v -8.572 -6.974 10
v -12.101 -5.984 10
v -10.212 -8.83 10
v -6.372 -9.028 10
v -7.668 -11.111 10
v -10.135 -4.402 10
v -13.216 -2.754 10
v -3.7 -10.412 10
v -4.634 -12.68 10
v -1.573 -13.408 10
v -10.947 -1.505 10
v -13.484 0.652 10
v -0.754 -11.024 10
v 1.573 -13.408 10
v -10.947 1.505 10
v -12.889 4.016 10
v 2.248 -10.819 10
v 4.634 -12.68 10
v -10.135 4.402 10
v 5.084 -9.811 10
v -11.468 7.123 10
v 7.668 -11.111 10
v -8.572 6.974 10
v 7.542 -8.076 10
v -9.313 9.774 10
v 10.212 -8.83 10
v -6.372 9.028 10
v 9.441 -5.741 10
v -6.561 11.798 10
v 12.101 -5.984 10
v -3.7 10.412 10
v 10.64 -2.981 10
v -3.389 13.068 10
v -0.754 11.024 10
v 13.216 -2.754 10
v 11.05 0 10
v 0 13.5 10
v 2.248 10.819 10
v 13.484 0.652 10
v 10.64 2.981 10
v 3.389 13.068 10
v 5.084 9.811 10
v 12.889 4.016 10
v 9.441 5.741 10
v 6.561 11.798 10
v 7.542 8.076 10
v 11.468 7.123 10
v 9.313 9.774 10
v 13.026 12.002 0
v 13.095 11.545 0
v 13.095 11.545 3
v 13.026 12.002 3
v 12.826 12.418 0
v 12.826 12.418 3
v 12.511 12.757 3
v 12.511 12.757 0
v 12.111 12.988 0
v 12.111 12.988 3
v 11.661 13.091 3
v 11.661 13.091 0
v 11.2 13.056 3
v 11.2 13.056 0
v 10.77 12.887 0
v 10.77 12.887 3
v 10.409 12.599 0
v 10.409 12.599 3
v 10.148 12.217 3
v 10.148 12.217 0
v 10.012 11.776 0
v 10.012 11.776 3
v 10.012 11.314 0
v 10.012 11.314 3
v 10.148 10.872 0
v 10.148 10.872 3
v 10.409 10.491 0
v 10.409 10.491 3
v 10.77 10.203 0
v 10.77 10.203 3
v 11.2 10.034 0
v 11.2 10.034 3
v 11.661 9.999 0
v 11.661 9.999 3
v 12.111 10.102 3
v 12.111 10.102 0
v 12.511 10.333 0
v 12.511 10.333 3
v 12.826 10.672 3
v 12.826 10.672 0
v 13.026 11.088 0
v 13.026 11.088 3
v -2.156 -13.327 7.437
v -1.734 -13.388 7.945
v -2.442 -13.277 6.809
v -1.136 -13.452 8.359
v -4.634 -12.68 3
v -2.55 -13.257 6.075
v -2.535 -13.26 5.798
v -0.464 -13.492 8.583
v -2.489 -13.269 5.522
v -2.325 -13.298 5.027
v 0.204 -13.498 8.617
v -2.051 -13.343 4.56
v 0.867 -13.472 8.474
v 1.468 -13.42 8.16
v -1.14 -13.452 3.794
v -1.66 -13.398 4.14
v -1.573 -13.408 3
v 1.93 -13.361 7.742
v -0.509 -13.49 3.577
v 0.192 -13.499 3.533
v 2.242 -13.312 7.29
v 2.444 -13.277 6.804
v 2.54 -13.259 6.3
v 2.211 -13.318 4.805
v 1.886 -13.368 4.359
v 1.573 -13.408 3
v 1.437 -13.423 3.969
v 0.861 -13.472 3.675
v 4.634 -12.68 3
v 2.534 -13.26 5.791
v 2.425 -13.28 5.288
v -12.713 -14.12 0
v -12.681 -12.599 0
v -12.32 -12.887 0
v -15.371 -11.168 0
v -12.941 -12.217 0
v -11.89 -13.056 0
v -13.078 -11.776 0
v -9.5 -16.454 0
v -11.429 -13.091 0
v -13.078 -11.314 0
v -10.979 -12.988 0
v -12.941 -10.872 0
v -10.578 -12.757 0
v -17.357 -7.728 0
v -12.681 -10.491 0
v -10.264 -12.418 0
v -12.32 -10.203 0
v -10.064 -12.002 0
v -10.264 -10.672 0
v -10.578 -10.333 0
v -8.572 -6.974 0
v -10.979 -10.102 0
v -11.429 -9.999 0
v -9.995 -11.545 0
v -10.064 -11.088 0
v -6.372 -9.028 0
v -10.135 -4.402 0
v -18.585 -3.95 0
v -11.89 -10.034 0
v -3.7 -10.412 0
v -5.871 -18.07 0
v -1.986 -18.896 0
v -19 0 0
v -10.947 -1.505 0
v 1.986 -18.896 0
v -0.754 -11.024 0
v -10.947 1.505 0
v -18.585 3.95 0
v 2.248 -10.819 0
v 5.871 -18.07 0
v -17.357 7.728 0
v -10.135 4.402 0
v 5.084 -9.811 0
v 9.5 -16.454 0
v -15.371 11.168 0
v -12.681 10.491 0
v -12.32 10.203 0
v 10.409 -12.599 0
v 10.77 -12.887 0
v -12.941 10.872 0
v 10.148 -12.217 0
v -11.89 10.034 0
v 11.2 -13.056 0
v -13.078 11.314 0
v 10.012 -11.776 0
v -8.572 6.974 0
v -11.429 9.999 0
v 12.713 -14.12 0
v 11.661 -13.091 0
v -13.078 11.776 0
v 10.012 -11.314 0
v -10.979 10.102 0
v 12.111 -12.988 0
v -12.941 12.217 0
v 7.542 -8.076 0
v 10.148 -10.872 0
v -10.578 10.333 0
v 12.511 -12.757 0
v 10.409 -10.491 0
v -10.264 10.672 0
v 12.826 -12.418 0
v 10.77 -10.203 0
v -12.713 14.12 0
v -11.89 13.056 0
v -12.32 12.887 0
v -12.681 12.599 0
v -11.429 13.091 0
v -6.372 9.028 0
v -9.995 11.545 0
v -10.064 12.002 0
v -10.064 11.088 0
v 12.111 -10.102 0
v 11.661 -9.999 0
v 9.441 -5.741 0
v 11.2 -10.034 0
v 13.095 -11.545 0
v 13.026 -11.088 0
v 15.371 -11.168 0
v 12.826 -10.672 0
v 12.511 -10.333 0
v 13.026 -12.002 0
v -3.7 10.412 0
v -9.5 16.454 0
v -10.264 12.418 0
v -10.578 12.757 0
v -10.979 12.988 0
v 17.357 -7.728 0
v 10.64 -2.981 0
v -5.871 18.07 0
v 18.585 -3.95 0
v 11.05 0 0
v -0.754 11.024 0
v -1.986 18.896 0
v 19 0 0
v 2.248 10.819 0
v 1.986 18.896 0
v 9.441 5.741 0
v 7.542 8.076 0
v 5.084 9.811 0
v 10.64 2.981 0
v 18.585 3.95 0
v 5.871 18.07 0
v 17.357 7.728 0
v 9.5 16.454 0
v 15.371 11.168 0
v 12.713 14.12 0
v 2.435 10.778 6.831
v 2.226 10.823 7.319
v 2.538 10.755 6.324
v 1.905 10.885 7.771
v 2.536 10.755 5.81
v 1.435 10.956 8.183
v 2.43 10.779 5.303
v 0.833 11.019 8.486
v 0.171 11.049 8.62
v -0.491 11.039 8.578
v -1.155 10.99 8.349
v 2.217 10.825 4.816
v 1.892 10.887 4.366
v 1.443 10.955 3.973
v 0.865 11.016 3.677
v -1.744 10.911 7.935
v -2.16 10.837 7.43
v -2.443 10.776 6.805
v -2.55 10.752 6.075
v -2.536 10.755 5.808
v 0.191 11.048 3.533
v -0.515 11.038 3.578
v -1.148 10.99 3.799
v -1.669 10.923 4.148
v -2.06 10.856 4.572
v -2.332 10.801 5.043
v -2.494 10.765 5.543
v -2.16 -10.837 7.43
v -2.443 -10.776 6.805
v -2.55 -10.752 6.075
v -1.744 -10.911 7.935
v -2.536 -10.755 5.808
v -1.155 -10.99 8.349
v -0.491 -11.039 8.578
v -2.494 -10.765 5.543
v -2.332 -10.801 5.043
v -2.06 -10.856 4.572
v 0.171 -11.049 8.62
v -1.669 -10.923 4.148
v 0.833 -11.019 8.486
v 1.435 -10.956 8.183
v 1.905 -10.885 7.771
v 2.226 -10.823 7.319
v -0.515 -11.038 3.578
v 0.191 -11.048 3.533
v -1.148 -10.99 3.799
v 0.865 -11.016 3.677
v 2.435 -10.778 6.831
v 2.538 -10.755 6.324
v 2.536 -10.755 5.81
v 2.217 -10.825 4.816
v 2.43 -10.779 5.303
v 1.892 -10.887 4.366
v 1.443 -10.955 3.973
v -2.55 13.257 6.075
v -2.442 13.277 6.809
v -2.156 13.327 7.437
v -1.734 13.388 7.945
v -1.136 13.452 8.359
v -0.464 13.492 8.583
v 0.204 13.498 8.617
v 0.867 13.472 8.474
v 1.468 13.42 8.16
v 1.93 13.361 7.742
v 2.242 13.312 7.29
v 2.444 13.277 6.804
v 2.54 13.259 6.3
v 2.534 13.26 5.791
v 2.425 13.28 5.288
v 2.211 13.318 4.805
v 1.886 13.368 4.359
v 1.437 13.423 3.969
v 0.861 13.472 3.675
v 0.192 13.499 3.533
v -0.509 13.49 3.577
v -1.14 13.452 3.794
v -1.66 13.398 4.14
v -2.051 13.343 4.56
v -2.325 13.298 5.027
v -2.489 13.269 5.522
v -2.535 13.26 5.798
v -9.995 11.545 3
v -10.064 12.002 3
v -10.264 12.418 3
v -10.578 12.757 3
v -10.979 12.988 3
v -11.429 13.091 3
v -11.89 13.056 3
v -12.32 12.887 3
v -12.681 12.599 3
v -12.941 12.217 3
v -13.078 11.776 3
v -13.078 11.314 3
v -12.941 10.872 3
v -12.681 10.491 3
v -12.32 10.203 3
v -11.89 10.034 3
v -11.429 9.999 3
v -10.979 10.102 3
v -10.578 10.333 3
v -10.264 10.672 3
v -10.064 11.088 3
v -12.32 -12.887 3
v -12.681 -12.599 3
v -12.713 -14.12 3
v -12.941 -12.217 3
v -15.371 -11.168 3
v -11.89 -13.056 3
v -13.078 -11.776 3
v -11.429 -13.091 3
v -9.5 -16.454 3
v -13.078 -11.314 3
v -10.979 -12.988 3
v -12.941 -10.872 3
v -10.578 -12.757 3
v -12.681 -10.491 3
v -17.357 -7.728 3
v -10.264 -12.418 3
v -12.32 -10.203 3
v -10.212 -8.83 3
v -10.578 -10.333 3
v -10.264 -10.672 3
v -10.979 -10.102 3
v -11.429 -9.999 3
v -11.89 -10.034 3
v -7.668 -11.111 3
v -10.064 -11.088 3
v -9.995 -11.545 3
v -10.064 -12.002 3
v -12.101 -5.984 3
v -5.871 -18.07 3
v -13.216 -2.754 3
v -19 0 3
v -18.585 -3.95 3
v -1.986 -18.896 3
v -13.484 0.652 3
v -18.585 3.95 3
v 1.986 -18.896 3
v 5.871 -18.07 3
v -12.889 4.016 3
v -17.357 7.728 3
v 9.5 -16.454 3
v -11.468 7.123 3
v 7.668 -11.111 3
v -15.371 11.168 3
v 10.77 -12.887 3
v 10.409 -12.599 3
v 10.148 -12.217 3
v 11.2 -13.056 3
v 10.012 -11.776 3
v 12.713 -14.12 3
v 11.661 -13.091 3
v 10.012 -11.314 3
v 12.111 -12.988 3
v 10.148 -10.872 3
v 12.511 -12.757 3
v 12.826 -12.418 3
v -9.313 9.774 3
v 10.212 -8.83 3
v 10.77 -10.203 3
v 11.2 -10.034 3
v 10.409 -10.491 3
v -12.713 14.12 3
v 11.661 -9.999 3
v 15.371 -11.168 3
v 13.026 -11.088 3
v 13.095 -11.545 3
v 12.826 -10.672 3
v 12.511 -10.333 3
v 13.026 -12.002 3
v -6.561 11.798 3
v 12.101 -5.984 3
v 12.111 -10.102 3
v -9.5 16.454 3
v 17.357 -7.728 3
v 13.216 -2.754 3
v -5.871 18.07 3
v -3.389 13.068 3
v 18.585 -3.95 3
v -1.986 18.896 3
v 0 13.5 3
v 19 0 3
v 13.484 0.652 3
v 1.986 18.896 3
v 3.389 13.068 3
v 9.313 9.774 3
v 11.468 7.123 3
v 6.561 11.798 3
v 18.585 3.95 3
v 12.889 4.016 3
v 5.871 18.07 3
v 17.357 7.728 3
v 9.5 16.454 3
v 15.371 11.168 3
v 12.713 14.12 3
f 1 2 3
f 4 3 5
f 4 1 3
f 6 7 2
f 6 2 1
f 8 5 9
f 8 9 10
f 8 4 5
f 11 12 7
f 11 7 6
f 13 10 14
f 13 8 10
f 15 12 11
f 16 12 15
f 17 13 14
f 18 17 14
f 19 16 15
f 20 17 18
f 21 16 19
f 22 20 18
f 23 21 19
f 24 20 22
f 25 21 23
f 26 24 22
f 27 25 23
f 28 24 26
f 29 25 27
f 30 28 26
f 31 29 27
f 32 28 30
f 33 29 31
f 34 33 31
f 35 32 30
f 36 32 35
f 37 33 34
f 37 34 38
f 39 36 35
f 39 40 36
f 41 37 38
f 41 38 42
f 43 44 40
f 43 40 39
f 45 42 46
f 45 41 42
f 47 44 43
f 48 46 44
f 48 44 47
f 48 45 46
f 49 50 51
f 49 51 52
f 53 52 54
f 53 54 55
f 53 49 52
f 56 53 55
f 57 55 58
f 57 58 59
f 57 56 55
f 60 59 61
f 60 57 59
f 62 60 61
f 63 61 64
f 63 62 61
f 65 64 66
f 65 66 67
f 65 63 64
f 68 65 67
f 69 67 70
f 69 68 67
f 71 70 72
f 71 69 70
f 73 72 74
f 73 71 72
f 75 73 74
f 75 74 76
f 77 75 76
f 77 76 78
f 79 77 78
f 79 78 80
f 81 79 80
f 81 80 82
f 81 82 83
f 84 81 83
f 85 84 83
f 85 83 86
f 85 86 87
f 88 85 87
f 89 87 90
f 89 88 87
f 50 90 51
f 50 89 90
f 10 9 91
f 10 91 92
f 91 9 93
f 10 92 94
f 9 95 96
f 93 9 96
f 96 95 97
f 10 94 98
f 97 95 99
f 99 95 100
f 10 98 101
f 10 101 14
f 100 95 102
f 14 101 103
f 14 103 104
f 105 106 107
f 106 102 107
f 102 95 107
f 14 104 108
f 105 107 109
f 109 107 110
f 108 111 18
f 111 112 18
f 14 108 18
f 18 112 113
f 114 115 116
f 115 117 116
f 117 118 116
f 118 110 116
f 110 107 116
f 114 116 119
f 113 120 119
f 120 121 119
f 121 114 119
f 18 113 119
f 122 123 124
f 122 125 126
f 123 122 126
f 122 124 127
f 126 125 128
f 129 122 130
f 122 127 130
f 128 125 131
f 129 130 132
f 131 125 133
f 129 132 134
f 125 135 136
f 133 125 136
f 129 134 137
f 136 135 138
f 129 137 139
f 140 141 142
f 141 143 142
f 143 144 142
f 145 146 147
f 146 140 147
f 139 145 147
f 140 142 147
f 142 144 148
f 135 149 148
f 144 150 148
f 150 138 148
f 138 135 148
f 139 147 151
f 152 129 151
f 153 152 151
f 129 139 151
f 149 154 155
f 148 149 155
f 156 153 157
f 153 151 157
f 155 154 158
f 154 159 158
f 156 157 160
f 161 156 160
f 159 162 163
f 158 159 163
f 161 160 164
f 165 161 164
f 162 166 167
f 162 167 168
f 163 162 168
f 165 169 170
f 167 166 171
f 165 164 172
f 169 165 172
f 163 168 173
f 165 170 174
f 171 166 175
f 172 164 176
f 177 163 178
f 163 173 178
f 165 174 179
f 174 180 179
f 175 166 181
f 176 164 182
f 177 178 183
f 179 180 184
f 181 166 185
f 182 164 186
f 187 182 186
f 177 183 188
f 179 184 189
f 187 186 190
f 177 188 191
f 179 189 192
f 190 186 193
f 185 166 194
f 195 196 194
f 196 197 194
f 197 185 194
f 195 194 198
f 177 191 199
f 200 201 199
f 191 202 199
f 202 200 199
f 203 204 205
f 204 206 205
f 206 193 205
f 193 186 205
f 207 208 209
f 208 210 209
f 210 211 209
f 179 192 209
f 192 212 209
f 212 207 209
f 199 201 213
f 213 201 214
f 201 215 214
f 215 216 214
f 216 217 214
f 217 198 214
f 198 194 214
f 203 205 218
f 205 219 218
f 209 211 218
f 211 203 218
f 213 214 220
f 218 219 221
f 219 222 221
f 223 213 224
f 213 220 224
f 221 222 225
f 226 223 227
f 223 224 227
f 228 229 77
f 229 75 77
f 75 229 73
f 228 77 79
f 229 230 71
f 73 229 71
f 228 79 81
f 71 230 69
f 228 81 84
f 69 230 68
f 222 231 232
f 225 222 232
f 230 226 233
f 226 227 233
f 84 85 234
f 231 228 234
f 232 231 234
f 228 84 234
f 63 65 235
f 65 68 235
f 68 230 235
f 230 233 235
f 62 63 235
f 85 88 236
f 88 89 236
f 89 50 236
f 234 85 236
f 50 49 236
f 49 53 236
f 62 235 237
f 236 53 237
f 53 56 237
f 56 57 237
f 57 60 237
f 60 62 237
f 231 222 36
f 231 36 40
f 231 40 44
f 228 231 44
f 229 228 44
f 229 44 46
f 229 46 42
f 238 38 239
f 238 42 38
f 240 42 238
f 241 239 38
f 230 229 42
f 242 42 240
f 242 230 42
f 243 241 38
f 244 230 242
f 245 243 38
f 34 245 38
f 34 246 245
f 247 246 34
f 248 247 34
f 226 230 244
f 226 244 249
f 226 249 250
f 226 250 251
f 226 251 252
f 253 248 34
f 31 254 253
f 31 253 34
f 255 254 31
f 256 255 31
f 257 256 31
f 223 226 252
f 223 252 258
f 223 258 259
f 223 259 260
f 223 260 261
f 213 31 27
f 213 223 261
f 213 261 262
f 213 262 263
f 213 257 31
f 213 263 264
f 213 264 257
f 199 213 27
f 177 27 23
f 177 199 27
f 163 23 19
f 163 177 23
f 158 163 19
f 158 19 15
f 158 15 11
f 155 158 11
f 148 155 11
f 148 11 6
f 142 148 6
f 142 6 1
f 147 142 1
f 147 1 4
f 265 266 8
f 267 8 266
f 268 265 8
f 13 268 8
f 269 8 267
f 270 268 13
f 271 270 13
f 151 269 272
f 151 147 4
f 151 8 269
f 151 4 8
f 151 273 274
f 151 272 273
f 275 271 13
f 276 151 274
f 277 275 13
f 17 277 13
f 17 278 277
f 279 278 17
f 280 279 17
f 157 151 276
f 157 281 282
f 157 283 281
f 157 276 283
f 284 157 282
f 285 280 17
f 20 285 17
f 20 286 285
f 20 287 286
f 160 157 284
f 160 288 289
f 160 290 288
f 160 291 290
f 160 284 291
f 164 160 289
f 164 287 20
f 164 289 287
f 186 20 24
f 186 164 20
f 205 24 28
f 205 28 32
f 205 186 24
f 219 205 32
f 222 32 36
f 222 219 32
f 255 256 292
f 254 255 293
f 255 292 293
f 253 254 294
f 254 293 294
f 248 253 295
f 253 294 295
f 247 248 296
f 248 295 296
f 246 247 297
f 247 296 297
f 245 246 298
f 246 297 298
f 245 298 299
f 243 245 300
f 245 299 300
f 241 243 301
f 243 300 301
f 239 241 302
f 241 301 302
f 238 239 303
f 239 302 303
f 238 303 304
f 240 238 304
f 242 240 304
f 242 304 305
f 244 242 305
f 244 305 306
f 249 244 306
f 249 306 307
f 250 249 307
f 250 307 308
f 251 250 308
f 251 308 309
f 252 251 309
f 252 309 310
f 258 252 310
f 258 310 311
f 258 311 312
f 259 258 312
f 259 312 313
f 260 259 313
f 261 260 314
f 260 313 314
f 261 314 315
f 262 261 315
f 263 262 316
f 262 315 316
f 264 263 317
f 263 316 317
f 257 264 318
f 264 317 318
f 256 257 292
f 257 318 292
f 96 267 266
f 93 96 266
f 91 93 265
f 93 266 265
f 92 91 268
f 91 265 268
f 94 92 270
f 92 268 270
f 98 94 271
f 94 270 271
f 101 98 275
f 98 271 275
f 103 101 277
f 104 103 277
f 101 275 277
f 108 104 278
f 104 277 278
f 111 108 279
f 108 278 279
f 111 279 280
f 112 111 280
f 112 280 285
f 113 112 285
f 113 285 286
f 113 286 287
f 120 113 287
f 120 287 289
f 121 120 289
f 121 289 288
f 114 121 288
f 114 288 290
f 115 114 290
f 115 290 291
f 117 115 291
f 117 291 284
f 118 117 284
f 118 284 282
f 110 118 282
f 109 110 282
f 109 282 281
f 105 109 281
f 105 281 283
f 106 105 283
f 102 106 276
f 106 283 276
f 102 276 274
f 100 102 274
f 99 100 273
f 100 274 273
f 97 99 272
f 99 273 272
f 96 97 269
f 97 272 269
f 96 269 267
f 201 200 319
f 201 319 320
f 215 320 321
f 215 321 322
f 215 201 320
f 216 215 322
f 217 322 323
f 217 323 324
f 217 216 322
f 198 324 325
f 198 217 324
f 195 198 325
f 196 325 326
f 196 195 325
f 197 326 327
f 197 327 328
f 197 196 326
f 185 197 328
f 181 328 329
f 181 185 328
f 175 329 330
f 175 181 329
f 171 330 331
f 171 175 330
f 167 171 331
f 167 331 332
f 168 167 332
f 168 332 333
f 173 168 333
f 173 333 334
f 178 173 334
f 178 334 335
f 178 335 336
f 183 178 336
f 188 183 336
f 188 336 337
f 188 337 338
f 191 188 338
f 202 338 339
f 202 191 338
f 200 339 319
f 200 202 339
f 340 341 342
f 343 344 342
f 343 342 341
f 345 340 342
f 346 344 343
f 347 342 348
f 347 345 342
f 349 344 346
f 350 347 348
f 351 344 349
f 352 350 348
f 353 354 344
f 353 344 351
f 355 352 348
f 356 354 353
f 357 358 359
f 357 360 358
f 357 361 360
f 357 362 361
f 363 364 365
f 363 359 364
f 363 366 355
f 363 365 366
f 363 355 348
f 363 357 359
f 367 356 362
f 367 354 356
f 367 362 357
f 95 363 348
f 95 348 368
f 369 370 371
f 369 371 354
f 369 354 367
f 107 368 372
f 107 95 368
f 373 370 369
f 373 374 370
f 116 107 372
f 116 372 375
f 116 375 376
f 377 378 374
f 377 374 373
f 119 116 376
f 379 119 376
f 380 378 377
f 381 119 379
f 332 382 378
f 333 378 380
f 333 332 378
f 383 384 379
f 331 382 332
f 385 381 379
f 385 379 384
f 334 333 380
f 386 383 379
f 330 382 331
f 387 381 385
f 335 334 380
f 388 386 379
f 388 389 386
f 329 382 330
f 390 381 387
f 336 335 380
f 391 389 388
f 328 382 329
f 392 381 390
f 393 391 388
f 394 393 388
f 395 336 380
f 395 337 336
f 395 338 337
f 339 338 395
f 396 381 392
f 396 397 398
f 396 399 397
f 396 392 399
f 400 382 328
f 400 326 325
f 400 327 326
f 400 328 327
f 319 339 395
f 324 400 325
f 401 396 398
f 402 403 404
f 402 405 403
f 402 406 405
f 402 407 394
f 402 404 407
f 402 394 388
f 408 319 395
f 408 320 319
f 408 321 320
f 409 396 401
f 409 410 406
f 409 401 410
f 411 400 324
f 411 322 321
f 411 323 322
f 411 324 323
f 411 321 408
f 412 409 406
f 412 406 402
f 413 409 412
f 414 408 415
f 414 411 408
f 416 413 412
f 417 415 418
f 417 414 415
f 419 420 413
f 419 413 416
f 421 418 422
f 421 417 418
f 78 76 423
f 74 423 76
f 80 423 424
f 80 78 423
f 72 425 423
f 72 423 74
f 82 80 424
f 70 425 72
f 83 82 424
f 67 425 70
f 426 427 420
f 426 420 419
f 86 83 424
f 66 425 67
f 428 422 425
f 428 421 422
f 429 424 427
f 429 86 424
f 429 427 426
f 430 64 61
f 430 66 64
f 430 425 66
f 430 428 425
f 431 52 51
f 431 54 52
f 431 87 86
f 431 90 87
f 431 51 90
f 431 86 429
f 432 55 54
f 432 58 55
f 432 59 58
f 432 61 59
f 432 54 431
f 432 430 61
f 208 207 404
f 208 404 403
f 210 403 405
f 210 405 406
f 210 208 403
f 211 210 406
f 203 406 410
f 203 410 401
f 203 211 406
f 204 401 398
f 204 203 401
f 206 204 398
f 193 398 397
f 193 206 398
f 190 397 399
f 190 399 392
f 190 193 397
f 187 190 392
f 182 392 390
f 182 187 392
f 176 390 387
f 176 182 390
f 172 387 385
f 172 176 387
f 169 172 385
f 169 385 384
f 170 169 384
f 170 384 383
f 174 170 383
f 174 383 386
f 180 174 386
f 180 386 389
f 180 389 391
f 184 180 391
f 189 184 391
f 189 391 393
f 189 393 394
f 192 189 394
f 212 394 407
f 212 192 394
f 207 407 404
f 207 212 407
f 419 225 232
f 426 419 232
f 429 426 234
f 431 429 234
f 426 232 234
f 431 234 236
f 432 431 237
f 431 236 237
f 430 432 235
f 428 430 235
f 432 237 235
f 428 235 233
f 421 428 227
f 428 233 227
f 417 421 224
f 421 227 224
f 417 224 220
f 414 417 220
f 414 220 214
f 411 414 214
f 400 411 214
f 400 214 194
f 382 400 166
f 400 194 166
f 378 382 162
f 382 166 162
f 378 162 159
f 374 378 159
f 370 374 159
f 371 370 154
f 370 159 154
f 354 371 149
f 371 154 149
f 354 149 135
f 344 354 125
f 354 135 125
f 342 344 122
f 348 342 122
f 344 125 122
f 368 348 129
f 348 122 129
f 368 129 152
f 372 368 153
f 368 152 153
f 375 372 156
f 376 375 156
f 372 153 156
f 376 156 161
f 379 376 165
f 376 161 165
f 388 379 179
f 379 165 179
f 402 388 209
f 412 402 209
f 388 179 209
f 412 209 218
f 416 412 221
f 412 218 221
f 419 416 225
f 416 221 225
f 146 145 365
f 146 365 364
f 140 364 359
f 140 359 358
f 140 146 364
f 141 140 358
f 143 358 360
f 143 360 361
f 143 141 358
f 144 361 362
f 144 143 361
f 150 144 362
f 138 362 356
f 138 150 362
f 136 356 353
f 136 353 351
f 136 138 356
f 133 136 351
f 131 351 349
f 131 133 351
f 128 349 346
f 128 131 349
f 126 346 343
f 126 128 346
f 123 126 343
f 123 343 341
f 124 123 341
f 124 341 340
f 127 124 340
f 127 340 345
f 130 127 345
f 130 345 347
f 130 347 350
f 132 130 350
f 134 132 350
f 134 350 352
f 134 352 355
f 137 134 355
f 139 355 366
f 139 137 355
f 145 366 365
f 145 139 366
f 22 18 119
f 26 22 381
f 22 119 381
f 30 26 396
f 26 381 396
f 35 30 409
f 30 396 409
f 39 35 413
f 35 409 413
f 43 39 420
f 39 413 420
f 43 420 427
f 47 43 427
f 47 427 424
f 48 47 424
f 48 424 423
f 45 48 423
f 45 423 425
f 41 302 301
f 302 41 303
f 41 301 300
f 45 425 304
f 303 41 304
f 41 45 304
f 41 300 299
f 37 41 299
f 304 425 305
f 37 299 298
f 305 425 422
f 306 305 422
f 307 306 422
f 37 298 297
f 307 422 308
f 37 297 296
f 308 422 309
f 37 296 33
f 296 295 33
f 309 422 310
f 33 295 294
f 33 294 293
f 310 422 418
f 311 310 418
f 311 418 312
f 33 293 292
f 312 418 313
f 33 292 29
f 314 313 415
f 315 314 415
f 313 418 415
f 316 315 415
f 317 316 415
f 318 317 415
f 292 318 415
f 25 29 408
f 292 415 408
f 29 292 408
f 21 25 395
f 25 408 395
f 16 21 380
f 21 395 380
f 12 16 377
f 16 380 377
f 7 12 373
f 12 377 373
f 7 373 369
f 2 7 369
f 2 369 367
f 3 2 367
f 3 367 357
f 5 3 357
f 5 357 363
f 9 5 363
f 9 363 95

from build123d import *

# Parameters (mm, degrees)
F0_R     = 11.05
F1_DEPTH = 10
F4_D     = 5
F4_DEPTH = 19.5
F4_TIP   = 1.5021515476
F5_R     = 19
F5_R_2   = 1.55
F5_R_3   = 13.5
F6_DEPTH = 3
F9_D     = 5.1


with BuildPart() as f1:
    # F0 (on Top) → F1 (new body)
    with BuildSketch(Plane.XY):
        with BuildLine():
            ThreePointArc((4.633508996, -12.6799288004), (11.063506936, -7.7362015406), (13.5, 0))
            ThreePointArc((13.5, 0), (-7.7362015406, 11.063506936), (-4.633508996, -12.6799288004))
            ThreePointArc((-4.633508996, -12.6799288004), (0, -13.5), (4.633508996, -12.6799288004))
        make_face()
        Circle(F0_R, mode=Mode.SUBTRACT)
    extrude(amount=F1_DEPTH)

    # F4 (one way)
    with BuildSketch(Plane.XZ.offset(9.75)):
        with Locations((0, 5)):
            Circle(F4_D / 2)
    extrude(amount=-F4_DEPTH, mode=Mode.SUBTRACT)
    with Locations(Plane.XZ.offset(9.75)):
        with Locations((0, 5)):
            with Locations((0, 0, -(F4_DEPTH + F4_TIP / 2))):  # 118° drill point
                Cone(0, F4_D / 2, F4_TIP, mode=Mode.SUBTRACT)

    # F5 (on Top) → F6 (join)
    with BuildSketch(Plane.XY):
        Circle(F5_R)
        with Locations((-11.5448845004, -11.5448845004)):
            Circle(F5_R_2, mode=Mode.SUBTRACT)
        with Locations((11.5448845004, -11.5448845004)):
            Circle(F5_R_2, mode=Mode.SUBTRACT)
        with Locations((-11.5448845004, 11.5448845004)):
            Circle(F5_R_2, mode=Mode.SUBTRACT)
        Circle(F5_R_3, mode=Mode.SUBTRACT)
        with Locations((11.5448845004, 11.5448845004)):
            Circle(F5_R_2, mode=Mode.SUBTRACT)
    extrude(amount=F6_DEPTH)

    # F9 (through all)
    with Locations(Plane.XZ.offset(13.65)):
        with Locations((0, 6.0753664002)):
            Hole(F9_D / 2)


solid = f1.part
